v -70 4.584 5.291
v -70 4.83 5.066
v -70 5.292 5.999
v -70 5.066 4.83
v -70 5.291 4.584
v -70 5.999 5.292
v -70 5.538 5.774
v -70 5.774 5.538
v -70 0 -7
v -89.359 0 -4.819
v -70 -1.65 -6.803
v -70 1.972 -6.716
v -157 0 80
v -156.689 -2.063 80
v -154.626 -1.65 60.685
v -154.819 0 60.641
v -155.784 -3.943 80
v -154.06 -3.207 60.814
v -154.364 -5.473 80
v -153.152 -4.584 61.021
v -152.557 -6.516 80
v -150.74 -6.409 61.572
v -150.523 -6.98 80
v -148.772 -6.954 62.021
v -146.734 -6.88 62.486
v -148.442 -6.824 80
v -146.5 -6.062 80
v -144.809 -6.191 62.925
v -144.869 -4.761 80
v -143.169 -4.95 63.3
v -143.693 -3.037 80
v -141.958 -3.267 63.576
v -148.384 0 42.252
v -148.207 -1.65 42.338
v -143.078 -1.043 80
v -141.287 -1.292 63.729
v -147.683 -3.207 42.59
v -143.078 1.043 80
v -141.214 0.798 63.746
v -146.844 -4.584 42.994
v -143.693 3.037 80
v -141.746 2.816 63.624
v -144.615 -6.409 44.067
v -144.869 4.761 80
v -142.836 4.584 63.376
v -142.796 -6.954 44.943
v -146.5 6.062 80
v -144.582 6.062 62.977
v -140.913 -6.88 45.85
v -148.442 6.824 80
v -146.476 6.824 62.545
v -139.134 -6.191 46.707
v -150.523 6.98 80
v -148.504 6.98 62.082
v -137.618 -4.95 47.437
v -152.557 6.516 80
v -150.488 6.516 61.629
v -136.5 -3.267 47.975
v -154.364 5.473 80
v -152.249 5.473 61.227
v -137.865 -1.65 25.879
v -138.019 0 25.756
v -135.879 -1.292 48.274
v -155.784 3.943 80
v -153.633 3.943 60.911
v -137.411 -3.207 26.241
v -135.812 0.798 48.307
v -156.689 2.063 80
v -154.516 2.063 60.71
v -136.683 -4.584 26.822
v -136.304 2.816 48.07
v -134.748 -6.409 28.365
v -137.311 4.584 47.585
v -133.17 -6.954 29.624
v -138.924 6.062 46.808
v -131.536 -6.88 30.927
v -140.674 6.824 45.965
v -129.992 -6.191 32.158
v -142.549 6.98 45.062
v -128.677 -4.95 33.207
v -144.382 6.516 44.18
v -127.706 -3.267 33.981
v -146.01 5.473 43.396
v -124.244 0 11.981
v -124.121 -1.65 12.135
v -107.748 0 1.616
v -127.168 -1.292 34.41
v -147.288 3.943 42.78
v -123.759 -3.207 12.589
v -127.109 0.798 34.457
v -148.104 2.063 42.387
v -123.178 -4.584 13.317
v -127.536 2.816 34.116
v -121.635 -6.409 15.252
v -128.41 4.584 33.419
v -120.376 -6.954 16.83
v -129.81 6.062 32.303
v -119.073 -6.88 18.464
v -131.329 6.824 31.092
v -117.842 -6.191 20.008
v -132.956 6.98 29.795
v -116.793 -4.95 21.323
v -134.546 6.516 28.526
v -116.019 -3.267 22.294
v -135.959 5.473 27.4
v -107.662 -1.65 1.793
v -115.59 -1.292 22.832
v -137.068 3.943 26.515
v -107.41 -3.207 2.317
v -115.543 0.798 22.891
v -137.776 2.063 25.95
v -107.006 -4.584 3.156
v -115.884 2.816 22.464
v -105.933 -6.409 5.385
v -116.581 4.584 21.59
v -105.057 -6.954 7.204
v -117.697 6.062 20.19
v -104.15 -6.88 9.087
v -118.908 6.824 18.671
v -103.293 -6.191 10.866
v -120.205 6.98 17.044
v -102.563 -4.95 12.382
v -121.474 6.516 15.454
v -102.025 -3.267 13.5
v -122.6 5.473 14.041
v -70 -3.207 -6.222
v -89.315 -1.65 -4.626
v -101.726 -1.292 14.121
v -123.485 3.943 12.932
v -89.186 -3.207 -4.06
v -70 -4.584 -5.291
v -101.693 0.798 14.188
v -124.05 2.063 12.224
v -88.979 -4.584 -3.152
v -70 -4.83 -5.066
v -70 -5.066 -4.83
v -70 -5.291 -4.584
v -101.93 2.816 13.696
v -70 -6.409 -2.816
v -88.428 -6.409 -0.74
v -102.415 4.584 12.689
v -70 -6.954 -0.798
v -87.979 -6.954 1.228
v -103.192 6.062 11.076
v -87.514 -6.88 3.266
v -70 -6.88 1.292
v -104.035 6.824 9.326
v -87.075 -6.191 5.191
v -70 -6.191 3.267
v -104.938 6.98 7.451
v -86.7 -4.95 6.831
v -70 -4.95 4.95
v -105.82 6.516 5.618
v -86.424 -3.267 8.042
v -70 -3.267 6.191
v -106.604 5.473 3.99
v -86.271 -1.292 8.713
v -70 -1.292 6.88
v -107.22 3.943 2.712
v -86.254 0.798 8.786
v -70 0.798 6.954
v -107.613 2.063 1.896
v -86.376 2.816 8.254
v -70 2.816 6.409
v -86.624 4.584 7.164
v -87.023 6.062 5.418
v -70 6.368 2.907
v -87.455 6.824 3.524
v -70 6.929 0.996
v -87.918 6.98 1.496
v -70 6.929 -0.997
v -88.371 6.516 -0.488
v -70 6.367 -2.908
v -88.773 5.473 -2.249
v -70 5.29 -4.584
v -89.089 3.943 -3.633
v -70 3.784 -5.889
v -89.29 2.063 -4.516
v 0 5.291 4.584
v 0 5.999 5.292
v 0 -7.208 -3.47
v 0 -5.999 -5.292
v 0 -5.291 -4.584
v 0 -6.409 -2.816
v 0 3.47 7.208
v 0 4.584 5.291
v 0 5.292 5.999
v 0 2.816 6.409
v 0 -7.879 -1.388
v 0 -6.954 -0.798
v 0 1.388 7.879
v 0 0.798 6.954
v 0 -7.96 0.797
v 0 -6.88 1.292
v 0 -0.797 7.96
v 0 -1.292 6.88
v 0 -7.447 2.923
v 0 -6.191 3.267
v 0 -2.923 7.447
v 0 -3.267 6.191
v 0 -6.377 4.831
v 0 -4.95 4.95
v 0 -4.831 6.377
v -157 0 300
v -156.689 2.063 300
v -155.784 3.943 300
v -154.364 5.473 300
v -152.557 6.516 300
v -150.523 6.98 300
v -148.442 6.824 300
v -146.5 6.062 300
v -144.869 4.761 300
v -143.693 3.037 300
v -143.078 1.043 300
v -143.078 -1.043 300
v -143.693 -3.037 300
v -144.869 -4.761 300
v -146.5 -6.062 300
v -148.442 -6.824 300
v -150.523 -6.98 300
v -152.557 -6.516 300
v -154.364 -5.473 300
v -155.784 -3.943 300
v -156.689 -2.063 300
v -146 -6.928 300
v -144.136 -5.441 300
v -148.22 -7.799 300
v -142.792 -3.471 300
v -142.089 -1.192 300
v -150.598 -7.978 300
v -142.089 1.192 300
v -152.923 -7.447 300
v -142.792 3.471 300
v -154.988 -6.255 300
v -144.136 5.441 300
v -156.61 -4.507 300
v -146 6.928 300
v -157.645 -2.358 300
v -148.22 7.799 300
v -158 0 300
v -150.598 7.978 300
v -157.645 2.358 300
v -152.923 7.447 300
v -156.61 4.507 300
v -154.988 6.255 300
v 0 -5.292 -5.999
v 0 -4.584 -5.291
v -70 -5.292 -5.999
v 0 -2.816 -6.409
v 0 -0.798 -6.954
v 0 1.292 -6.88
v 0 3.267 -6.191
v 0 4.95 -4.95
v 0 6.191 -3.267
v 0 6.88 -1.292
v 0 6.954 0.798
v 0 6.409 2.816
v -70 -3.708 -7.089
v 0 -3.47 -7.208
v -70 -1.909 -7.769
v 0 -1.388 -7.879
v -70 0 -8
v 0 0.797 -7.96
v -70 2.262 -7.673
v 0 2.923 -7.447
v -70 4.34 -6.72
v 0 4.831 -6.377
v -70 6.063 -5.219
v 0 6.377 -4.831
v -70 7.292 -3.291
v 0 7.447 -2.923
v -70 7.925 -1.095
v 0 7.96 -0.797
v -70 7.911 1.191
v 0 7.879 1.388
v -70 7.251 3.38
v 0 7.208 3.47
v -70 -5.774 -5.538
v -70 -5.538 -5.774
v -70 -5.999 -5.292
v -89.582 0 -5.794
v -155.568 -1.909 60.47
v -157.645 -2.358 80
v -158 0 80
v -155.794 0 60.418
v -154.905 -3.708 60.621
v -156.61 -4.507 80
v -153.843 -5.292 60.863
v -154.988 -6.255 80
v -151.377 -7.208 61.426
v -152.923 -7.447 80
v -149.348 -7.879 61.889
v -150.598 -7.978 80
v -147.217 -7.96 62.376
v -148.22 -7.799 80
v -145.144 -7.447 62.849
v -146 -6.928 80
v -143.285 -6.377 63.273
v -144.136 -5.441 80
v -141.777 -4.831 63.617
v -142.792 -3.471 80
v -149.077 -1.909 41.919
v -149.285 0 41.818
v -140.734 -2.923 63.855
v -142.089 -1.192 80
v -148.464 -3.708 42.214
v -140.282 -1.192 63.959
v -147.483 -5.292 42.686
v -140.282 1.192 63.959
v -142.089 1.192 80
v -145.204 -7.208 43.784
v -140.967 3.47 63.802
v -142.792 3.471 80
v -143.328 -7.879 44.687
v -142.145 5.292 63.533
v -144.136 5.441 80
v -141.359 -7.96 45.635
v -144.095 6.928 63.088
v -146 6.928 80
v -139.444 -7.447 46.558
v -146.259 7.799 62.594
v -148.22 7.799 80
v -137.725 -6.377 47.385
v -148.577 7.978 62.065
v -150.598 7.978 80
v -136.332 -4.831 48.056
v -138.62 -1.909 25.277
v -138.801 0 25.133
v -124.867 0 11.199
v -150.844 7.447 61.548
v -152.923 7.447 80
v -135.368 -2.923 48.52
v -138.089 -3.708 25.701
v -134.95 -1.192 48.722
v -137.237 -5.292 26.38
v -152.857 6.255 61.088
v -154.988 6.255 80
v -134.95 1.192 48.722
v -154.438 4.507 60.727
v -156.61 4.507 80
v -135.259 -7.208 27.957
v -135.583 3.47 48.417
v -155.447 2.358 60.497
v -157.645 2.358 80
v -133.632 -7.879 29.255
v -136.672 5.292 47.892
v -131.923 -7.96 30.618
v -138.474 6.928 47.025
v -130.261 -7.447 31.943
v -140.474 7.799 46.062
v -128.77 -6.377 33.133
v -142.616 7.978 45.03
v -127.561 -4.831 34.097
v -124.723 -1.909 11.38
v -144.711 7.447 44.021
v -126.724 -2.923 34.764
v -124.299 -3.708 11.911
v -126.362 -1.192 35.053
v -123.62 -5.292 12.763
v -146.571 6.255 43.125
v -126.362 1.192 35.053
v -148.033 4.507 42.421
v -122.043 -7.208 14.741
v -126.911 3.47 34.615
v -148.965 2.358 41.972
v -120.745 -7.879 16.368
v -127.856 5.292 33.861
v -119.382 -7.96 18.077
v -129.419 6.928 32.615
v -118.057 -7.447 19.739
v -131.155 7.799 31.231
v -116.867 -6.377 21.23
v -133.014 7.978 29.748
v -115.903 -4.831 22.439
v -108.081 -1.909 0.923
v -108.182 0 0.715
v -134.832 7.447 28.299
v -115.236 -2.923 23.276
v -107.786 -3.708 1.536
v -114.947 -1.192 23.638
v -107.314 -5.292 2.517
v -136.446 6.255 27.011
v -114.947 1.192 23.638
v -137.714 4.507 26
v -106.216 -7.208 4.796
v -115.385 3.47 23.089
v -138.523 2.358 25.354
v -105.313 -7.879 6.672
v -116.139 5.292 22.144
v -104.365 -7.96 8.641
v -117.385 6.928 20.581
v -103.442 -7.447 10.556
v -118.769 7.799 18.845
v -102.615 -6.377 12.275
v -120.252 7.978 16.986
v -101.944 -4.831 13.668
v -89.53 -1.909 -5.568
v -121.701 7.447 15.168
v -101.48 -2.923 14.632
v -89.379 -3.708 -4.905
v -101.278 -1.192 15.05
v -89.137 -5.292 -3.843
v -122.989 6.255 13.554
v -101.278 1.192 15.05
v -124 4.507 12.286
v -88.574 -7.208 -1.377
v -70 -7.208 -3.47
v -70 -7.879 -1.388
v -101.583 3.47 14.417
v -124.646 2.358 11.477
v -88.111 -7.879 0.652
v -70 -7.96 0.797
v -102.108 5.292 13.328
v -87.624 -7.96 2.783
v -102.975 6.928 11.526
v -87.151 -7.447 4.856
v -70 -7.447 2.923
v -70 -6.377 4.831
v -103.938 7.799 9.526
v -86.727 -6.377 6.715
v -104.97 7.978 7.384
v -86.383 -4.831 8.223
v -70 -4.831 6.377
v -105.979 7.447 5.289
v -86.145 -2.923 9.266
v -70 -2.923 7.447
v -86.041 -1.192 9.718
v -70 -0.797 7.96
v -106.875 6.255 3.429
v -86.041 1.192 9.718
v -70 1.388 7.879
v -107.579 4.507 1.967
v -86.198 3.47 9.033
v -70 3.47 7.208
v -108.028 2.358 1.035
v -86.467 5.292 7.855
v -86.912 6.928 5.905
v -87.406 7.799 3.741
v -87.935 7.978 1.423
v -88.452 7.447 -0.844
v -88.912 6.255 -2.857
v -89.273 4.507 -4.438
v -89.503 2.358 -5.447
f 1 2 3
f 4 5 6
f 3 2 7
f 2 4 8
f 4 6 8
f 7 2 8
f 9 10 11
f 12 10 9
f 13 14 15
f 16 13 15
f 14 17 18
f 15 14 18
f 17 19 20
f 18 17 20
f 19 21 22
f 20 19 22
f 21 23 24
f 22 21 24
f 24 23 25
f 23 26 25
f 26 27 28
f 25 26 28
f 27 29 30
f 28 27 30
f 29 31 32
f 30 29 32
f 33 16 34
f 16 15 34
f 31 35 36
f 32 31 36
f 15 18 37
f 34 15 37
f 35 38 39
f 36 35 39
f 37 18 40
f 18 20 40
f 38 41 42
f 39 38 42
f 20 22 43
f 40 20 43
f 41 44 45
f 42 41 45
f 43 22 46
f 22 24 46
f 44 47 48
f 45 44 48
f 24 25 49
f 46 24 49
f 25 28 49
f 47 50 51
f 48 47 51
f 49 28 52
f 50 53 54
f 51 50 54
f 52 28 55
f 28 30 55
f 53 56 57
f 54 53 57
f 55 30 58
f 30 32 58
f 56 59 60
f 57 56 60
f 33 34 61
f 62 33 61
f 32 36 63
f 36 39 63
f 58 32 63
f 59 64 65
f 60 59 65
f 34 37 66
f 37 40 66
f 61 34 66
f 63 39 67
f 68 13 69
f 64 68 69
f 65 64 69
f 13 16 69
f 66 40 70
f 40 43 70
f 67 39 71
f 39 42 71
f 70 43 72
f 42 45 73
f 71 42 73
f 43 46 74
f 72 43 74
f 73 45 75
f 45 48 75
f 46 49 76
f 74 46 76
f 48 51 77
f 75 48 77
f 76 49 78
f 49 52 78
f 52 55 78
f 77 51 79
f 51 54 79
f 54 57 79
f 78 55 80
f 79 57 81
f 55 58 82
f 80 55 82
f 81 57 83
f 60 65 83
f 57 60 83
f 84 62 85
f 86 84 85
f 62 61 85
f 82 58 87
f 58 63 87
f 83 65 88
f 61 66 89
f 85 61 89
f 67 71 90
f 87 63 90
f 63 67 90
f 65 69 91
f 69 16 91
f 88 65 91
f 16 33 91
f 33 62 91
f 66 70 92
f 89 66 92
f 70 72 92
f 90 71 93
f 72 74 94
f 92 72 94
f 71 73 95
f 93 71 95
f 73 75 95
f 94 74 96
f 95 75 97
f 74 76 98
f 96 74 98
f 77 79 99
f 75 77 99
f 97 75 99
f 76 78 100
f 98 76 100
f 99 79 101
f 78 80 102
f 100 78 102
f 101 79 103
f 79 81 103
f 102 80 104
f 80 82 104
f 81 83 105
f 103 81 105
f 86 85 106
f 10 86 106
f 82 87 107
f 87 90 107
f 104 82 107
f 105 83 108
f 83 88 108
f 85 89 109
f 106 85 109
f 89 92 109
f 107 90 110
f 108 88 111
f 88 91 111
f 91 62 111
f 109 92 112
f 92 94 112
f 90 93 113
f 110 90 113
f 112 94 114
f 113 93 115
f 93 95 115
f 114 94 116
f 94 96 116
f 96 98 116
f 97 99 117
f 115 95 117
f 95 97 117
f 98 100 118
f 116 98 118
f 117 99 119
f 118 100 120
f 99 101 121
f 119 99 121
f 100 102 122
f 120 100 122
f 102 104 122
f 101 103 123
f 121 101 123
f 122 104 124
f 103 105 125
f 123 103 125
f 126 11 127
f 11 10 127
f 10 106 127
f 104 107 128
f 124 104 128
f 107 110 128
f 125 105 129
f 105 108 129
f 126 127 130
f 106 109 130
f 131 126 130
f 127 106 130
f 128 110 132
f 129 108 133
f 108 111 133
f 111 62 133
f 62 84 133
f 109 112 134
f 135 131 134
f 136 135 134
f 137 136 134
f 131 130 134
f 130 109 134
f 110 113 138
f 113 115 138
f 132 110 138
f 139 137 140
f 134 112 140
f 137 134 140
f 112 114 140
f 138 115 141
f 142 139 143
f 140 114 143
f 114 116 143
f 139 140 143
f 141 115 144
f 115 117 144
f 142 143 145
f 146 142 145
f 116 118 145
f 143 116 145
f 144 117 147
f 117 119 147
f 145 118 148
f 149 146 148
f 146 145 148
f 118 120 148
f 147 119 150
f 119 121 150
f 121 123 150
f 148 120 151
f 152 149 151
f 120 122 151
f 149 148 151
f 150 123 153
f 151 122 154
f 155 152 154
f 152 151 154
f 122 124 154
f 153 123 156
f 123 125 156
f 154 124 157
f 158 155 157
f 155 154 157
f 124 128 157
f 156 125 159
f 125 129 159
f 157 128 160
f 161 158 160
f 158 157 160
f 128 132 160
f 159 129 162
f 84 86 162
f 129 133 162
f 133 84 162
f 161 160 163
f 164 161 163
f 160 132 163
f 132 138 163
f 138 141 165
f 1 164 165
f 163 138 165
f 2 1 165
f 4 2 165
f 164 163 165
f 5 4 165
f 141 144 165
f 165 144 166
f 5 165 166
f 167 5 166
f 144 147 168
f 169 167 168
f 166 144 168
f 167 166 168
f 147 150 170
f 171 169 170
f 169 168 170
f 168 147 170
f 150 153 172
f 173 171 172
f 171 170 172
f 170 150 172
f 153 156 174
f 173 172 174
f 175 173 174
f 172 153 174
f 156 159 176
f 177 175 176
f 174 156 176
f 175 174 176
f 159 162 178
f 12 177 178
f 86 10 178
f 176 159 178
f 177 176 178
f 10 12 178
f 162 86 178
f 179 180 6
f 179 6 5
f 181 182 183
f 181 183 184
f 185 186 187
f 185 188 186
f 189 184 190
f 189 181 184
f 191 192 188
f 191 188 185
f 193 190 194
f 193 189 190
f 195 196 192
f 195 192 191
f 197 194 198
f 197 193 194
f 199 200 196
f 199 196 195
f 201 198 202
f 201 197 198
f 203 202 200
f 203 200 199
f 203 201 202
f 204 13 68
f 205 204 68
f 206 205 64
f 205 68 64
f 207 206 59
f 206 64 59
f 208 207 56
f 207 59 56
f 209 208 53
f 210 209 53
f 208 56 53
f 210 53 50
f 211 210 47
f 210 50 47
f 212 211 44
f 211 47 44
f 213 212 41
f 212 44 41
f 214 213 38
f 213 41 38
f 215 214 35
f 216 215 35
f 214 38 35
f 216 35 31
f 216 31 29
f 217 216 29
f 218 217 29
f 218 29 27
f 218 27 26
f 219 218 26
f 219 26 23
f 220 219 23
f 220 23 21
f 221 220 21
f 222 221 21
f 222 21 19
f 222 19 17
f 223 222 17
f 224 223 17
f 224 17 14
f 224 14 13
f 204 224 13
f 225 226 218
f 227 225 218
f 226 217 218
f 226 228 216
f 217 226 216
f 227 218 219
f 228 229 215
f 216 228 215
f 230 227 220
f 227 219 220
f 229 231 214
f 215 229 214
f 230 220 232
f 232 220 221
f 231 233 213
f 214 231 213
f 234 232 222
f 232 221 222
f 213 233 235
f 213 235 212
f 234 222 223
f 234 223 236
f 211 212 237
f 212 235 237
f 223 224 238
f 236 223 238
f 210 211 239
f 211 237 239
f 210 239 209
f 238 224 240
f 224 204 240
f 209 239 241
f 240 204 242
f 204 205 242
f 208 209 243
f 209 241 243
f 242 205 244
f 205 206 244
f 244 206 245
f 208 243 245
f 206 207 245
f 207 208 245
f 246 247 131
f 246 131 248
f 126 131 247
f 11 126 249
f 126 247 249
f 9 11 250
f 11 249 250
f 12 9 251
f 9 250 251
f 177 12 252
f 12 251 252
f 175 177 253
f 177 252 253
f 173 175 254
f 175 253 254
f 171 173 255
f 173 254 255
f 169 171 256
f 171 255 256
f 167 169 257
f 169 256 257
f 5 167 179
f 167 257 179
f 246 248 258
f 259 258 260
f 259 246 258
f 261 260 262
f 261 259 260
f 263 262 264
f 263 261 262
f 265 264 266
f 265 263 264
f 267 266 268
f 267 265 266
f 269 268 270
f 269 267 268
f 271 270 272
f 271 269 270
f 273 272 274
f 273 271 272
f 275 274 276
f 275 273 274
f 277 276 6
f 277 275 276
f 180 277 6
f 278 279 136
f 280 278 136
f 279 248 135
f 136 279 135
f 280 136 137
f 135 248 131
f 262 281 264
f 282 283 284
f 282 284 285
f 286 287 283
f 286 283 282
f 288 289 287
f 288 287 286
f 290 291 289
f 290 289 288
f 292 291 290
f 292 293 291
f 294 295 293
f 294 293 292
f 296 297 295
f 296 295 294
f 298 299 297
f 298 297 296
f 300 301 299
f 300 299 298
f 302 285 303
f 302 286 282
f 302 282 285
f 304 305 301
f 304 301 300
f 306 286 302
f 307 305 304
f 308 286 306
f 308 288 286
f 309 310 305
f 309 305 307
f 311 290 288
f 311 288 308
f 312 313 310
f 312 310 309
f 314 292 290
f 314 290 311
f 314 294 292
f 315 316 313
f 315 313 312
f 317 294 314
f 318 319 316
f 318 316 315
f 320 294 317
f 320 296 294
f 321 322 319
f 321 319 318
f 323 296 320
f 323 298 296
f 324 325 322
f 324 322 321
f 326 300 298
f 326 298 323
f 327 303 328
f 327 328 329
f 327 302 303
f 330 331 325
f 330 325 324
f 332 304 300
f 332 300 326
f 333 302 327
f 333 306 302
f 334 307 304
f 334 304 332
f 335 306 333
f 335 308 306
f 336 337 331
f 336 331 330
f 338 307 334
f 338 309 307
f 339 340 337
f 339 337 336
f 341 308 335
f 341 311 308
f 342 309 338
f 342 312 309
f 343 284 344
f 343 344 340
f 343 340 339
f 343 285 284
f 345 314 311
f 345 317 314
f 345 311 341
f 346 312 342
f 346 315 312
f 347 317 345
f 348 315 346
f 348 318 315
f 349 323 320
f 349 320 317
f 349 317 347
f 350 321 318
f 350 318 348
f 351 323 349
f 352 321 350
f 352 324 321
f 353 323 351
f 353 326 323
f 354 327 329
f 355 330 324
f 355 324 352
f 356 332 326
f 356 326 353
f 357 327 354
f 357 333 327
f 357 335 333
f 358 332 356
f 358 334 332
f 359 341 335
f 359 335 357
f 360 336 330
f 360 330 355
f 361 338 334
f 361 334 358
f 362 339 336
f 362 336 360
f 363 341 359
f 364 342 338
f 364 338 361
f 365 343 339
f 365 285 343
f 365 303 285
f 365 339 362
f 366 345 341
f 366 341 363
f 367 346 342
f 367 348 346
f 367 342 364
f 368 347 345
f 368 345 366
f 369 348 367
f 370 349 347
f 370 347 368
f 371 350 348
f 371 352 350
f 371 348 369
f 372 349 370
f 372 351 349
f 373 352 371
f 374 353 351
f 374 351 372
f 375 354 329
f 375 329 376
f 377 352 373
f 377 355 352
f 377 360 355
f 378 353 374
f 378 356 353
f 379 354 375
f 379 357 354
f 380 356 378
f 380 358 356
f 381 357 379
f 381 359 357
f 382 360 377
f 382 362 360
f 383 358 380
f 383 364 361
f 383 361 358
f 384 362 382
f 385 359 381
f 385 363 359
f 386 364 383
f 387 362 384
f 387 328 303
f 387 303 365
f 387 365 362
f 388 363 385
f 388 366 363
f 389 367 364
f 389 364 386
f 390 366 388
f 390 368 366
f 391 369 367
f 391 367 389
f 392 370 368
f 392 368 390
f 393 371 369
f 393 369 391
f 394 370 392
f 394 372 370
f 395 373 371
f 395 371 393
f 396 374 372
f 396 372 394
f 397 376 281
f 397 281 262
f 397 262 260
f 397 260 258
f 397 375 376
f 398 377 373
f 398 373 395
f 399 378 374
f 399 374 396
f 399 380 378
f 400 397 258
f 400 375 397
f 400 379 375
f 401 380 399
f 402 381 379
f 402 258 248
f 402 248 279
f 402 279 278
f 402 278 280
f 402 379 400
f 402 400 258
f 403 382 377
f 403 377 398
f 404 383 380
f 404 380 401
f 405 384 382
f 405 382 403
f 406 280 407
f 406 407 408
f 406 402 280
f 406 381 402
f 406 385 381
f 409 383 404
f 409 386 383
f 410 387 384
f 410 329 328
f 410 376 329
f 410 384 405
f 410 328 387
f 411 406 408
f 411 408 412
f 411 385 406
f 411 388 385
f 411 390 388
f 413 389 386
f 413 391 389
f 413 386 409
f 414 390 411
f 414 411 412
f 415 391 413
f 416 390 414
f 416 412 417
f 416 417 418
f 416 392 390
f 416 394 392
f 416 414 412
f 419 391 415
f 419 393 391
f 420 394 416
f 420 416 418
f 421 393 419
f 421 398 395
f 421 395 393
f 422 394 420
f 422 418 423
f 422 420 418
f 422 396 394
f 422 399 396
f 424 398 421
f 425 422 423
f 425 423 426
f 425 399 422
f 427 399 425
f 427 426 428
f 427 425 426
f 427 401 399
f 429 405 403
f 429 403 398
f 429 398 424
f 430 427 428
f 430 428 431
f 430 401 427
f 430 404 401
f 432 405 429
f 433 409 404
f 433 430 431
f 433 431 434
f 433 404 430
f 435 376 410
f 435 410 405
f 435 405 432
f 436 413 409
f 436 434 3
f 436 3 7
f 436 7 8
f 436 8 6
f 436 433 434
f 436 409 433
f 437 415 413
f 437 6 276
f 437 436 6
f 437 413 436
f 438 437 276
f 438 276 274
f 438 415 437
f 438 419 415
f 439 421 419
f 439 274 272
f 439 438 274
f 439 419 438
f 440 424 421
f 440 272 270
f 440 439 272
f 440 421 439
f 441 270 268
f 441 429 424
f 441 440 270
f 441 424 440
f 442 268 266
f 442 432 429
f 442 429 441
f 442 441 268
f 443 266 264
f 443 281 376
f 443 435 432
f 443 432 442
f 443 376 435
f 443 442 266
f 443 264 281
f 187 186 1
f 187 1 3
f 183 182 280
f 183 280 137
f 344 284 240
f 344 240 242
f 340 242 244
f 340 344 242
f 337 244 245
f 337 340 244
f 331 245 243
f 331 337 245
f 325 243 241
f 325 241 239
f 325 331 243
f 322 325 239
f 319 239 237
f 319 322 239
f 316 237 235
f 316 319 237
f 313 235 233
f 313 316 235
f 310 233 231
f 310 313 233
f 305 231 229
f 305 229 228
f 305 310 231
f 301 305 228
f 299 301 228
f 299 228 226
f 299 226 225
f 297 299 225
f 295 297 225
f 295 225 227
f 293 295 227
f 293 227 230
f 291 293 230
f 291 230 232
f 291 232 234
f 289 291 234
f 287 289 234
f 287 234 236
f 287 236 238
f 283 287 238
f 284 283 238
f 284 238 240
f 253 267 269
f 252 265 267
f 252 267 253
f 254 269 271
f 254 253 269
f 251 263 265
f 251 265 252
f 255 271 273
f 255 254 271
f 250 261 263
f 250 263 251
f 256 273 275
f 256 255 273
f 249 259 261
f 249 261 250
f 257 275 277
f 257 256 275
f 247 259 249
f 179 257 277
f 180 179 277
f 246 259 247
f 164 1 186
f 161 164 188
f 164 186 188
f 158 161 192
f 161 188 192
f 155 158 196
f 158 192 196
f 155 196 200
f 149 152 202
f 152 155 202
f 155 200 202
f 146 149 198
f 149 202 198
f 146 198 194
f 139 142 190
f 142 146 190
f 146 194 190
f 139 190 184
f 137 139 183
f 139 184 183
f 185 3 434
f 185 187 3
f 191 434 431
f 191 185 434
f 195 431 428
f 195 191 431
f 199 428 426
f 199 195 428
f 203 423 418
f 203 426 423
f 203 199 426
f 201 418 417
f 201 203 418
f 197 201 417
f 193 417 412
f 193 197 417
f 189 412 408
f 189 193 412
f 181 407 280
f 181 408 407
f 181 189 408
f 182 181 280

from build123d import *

# Parameters (mm, degrees)
SKETCH_2_R          = 8
SKETCH_2_R_2        = 7
CUT_EXTRUDE_1_DEPTH = 70


with BuildPart() as part:
    # По траектории1: sweep along a path in Эскиз1
    with BuildLine(Plane(origin=(0, 0, 0), x_dir=(1, 0, 0), z_dir=(0, 1, 0))) as sweep_1_path:
        Line((-150, -300), (-150, -80))
        ThreePointArc((-150, -80), (-126.568542495, -23.431457505), (-70, 0))
        Line((-70, 0), (0, 0))
    # Эскиз2 → По траектории1 (sweep)
    with BuildSketch(Plane(origin=(0, 0, 0), x_dir=(0, 0, -1), z_dir=(1, 0, 0))):
        Circle(SKETCH_2_R)
        Circle(SKETCH_2_R_2, mode=Mode.SUBTRACT)
    sweep(path=sweep_1_path.line)

    # Эскиз3 → Вырез-Вытянуть1 (cut)
    with BuildSketch(Plane(origin=(0, 0, 0), x_dir=(0, 0, -1), z_dir=(1, 0, 0))):
        Polygon((5.303300859, -6.01040764), (-6.01040764, 5.303300859), (-5.303300859, 6.01040764), (6.01040764, -5.303300859), align=None)
    extrude(amount=-CUT_EXTRUDE_1_DEPTH, mode=Mode.SUBTRACT)


solid = part.part
